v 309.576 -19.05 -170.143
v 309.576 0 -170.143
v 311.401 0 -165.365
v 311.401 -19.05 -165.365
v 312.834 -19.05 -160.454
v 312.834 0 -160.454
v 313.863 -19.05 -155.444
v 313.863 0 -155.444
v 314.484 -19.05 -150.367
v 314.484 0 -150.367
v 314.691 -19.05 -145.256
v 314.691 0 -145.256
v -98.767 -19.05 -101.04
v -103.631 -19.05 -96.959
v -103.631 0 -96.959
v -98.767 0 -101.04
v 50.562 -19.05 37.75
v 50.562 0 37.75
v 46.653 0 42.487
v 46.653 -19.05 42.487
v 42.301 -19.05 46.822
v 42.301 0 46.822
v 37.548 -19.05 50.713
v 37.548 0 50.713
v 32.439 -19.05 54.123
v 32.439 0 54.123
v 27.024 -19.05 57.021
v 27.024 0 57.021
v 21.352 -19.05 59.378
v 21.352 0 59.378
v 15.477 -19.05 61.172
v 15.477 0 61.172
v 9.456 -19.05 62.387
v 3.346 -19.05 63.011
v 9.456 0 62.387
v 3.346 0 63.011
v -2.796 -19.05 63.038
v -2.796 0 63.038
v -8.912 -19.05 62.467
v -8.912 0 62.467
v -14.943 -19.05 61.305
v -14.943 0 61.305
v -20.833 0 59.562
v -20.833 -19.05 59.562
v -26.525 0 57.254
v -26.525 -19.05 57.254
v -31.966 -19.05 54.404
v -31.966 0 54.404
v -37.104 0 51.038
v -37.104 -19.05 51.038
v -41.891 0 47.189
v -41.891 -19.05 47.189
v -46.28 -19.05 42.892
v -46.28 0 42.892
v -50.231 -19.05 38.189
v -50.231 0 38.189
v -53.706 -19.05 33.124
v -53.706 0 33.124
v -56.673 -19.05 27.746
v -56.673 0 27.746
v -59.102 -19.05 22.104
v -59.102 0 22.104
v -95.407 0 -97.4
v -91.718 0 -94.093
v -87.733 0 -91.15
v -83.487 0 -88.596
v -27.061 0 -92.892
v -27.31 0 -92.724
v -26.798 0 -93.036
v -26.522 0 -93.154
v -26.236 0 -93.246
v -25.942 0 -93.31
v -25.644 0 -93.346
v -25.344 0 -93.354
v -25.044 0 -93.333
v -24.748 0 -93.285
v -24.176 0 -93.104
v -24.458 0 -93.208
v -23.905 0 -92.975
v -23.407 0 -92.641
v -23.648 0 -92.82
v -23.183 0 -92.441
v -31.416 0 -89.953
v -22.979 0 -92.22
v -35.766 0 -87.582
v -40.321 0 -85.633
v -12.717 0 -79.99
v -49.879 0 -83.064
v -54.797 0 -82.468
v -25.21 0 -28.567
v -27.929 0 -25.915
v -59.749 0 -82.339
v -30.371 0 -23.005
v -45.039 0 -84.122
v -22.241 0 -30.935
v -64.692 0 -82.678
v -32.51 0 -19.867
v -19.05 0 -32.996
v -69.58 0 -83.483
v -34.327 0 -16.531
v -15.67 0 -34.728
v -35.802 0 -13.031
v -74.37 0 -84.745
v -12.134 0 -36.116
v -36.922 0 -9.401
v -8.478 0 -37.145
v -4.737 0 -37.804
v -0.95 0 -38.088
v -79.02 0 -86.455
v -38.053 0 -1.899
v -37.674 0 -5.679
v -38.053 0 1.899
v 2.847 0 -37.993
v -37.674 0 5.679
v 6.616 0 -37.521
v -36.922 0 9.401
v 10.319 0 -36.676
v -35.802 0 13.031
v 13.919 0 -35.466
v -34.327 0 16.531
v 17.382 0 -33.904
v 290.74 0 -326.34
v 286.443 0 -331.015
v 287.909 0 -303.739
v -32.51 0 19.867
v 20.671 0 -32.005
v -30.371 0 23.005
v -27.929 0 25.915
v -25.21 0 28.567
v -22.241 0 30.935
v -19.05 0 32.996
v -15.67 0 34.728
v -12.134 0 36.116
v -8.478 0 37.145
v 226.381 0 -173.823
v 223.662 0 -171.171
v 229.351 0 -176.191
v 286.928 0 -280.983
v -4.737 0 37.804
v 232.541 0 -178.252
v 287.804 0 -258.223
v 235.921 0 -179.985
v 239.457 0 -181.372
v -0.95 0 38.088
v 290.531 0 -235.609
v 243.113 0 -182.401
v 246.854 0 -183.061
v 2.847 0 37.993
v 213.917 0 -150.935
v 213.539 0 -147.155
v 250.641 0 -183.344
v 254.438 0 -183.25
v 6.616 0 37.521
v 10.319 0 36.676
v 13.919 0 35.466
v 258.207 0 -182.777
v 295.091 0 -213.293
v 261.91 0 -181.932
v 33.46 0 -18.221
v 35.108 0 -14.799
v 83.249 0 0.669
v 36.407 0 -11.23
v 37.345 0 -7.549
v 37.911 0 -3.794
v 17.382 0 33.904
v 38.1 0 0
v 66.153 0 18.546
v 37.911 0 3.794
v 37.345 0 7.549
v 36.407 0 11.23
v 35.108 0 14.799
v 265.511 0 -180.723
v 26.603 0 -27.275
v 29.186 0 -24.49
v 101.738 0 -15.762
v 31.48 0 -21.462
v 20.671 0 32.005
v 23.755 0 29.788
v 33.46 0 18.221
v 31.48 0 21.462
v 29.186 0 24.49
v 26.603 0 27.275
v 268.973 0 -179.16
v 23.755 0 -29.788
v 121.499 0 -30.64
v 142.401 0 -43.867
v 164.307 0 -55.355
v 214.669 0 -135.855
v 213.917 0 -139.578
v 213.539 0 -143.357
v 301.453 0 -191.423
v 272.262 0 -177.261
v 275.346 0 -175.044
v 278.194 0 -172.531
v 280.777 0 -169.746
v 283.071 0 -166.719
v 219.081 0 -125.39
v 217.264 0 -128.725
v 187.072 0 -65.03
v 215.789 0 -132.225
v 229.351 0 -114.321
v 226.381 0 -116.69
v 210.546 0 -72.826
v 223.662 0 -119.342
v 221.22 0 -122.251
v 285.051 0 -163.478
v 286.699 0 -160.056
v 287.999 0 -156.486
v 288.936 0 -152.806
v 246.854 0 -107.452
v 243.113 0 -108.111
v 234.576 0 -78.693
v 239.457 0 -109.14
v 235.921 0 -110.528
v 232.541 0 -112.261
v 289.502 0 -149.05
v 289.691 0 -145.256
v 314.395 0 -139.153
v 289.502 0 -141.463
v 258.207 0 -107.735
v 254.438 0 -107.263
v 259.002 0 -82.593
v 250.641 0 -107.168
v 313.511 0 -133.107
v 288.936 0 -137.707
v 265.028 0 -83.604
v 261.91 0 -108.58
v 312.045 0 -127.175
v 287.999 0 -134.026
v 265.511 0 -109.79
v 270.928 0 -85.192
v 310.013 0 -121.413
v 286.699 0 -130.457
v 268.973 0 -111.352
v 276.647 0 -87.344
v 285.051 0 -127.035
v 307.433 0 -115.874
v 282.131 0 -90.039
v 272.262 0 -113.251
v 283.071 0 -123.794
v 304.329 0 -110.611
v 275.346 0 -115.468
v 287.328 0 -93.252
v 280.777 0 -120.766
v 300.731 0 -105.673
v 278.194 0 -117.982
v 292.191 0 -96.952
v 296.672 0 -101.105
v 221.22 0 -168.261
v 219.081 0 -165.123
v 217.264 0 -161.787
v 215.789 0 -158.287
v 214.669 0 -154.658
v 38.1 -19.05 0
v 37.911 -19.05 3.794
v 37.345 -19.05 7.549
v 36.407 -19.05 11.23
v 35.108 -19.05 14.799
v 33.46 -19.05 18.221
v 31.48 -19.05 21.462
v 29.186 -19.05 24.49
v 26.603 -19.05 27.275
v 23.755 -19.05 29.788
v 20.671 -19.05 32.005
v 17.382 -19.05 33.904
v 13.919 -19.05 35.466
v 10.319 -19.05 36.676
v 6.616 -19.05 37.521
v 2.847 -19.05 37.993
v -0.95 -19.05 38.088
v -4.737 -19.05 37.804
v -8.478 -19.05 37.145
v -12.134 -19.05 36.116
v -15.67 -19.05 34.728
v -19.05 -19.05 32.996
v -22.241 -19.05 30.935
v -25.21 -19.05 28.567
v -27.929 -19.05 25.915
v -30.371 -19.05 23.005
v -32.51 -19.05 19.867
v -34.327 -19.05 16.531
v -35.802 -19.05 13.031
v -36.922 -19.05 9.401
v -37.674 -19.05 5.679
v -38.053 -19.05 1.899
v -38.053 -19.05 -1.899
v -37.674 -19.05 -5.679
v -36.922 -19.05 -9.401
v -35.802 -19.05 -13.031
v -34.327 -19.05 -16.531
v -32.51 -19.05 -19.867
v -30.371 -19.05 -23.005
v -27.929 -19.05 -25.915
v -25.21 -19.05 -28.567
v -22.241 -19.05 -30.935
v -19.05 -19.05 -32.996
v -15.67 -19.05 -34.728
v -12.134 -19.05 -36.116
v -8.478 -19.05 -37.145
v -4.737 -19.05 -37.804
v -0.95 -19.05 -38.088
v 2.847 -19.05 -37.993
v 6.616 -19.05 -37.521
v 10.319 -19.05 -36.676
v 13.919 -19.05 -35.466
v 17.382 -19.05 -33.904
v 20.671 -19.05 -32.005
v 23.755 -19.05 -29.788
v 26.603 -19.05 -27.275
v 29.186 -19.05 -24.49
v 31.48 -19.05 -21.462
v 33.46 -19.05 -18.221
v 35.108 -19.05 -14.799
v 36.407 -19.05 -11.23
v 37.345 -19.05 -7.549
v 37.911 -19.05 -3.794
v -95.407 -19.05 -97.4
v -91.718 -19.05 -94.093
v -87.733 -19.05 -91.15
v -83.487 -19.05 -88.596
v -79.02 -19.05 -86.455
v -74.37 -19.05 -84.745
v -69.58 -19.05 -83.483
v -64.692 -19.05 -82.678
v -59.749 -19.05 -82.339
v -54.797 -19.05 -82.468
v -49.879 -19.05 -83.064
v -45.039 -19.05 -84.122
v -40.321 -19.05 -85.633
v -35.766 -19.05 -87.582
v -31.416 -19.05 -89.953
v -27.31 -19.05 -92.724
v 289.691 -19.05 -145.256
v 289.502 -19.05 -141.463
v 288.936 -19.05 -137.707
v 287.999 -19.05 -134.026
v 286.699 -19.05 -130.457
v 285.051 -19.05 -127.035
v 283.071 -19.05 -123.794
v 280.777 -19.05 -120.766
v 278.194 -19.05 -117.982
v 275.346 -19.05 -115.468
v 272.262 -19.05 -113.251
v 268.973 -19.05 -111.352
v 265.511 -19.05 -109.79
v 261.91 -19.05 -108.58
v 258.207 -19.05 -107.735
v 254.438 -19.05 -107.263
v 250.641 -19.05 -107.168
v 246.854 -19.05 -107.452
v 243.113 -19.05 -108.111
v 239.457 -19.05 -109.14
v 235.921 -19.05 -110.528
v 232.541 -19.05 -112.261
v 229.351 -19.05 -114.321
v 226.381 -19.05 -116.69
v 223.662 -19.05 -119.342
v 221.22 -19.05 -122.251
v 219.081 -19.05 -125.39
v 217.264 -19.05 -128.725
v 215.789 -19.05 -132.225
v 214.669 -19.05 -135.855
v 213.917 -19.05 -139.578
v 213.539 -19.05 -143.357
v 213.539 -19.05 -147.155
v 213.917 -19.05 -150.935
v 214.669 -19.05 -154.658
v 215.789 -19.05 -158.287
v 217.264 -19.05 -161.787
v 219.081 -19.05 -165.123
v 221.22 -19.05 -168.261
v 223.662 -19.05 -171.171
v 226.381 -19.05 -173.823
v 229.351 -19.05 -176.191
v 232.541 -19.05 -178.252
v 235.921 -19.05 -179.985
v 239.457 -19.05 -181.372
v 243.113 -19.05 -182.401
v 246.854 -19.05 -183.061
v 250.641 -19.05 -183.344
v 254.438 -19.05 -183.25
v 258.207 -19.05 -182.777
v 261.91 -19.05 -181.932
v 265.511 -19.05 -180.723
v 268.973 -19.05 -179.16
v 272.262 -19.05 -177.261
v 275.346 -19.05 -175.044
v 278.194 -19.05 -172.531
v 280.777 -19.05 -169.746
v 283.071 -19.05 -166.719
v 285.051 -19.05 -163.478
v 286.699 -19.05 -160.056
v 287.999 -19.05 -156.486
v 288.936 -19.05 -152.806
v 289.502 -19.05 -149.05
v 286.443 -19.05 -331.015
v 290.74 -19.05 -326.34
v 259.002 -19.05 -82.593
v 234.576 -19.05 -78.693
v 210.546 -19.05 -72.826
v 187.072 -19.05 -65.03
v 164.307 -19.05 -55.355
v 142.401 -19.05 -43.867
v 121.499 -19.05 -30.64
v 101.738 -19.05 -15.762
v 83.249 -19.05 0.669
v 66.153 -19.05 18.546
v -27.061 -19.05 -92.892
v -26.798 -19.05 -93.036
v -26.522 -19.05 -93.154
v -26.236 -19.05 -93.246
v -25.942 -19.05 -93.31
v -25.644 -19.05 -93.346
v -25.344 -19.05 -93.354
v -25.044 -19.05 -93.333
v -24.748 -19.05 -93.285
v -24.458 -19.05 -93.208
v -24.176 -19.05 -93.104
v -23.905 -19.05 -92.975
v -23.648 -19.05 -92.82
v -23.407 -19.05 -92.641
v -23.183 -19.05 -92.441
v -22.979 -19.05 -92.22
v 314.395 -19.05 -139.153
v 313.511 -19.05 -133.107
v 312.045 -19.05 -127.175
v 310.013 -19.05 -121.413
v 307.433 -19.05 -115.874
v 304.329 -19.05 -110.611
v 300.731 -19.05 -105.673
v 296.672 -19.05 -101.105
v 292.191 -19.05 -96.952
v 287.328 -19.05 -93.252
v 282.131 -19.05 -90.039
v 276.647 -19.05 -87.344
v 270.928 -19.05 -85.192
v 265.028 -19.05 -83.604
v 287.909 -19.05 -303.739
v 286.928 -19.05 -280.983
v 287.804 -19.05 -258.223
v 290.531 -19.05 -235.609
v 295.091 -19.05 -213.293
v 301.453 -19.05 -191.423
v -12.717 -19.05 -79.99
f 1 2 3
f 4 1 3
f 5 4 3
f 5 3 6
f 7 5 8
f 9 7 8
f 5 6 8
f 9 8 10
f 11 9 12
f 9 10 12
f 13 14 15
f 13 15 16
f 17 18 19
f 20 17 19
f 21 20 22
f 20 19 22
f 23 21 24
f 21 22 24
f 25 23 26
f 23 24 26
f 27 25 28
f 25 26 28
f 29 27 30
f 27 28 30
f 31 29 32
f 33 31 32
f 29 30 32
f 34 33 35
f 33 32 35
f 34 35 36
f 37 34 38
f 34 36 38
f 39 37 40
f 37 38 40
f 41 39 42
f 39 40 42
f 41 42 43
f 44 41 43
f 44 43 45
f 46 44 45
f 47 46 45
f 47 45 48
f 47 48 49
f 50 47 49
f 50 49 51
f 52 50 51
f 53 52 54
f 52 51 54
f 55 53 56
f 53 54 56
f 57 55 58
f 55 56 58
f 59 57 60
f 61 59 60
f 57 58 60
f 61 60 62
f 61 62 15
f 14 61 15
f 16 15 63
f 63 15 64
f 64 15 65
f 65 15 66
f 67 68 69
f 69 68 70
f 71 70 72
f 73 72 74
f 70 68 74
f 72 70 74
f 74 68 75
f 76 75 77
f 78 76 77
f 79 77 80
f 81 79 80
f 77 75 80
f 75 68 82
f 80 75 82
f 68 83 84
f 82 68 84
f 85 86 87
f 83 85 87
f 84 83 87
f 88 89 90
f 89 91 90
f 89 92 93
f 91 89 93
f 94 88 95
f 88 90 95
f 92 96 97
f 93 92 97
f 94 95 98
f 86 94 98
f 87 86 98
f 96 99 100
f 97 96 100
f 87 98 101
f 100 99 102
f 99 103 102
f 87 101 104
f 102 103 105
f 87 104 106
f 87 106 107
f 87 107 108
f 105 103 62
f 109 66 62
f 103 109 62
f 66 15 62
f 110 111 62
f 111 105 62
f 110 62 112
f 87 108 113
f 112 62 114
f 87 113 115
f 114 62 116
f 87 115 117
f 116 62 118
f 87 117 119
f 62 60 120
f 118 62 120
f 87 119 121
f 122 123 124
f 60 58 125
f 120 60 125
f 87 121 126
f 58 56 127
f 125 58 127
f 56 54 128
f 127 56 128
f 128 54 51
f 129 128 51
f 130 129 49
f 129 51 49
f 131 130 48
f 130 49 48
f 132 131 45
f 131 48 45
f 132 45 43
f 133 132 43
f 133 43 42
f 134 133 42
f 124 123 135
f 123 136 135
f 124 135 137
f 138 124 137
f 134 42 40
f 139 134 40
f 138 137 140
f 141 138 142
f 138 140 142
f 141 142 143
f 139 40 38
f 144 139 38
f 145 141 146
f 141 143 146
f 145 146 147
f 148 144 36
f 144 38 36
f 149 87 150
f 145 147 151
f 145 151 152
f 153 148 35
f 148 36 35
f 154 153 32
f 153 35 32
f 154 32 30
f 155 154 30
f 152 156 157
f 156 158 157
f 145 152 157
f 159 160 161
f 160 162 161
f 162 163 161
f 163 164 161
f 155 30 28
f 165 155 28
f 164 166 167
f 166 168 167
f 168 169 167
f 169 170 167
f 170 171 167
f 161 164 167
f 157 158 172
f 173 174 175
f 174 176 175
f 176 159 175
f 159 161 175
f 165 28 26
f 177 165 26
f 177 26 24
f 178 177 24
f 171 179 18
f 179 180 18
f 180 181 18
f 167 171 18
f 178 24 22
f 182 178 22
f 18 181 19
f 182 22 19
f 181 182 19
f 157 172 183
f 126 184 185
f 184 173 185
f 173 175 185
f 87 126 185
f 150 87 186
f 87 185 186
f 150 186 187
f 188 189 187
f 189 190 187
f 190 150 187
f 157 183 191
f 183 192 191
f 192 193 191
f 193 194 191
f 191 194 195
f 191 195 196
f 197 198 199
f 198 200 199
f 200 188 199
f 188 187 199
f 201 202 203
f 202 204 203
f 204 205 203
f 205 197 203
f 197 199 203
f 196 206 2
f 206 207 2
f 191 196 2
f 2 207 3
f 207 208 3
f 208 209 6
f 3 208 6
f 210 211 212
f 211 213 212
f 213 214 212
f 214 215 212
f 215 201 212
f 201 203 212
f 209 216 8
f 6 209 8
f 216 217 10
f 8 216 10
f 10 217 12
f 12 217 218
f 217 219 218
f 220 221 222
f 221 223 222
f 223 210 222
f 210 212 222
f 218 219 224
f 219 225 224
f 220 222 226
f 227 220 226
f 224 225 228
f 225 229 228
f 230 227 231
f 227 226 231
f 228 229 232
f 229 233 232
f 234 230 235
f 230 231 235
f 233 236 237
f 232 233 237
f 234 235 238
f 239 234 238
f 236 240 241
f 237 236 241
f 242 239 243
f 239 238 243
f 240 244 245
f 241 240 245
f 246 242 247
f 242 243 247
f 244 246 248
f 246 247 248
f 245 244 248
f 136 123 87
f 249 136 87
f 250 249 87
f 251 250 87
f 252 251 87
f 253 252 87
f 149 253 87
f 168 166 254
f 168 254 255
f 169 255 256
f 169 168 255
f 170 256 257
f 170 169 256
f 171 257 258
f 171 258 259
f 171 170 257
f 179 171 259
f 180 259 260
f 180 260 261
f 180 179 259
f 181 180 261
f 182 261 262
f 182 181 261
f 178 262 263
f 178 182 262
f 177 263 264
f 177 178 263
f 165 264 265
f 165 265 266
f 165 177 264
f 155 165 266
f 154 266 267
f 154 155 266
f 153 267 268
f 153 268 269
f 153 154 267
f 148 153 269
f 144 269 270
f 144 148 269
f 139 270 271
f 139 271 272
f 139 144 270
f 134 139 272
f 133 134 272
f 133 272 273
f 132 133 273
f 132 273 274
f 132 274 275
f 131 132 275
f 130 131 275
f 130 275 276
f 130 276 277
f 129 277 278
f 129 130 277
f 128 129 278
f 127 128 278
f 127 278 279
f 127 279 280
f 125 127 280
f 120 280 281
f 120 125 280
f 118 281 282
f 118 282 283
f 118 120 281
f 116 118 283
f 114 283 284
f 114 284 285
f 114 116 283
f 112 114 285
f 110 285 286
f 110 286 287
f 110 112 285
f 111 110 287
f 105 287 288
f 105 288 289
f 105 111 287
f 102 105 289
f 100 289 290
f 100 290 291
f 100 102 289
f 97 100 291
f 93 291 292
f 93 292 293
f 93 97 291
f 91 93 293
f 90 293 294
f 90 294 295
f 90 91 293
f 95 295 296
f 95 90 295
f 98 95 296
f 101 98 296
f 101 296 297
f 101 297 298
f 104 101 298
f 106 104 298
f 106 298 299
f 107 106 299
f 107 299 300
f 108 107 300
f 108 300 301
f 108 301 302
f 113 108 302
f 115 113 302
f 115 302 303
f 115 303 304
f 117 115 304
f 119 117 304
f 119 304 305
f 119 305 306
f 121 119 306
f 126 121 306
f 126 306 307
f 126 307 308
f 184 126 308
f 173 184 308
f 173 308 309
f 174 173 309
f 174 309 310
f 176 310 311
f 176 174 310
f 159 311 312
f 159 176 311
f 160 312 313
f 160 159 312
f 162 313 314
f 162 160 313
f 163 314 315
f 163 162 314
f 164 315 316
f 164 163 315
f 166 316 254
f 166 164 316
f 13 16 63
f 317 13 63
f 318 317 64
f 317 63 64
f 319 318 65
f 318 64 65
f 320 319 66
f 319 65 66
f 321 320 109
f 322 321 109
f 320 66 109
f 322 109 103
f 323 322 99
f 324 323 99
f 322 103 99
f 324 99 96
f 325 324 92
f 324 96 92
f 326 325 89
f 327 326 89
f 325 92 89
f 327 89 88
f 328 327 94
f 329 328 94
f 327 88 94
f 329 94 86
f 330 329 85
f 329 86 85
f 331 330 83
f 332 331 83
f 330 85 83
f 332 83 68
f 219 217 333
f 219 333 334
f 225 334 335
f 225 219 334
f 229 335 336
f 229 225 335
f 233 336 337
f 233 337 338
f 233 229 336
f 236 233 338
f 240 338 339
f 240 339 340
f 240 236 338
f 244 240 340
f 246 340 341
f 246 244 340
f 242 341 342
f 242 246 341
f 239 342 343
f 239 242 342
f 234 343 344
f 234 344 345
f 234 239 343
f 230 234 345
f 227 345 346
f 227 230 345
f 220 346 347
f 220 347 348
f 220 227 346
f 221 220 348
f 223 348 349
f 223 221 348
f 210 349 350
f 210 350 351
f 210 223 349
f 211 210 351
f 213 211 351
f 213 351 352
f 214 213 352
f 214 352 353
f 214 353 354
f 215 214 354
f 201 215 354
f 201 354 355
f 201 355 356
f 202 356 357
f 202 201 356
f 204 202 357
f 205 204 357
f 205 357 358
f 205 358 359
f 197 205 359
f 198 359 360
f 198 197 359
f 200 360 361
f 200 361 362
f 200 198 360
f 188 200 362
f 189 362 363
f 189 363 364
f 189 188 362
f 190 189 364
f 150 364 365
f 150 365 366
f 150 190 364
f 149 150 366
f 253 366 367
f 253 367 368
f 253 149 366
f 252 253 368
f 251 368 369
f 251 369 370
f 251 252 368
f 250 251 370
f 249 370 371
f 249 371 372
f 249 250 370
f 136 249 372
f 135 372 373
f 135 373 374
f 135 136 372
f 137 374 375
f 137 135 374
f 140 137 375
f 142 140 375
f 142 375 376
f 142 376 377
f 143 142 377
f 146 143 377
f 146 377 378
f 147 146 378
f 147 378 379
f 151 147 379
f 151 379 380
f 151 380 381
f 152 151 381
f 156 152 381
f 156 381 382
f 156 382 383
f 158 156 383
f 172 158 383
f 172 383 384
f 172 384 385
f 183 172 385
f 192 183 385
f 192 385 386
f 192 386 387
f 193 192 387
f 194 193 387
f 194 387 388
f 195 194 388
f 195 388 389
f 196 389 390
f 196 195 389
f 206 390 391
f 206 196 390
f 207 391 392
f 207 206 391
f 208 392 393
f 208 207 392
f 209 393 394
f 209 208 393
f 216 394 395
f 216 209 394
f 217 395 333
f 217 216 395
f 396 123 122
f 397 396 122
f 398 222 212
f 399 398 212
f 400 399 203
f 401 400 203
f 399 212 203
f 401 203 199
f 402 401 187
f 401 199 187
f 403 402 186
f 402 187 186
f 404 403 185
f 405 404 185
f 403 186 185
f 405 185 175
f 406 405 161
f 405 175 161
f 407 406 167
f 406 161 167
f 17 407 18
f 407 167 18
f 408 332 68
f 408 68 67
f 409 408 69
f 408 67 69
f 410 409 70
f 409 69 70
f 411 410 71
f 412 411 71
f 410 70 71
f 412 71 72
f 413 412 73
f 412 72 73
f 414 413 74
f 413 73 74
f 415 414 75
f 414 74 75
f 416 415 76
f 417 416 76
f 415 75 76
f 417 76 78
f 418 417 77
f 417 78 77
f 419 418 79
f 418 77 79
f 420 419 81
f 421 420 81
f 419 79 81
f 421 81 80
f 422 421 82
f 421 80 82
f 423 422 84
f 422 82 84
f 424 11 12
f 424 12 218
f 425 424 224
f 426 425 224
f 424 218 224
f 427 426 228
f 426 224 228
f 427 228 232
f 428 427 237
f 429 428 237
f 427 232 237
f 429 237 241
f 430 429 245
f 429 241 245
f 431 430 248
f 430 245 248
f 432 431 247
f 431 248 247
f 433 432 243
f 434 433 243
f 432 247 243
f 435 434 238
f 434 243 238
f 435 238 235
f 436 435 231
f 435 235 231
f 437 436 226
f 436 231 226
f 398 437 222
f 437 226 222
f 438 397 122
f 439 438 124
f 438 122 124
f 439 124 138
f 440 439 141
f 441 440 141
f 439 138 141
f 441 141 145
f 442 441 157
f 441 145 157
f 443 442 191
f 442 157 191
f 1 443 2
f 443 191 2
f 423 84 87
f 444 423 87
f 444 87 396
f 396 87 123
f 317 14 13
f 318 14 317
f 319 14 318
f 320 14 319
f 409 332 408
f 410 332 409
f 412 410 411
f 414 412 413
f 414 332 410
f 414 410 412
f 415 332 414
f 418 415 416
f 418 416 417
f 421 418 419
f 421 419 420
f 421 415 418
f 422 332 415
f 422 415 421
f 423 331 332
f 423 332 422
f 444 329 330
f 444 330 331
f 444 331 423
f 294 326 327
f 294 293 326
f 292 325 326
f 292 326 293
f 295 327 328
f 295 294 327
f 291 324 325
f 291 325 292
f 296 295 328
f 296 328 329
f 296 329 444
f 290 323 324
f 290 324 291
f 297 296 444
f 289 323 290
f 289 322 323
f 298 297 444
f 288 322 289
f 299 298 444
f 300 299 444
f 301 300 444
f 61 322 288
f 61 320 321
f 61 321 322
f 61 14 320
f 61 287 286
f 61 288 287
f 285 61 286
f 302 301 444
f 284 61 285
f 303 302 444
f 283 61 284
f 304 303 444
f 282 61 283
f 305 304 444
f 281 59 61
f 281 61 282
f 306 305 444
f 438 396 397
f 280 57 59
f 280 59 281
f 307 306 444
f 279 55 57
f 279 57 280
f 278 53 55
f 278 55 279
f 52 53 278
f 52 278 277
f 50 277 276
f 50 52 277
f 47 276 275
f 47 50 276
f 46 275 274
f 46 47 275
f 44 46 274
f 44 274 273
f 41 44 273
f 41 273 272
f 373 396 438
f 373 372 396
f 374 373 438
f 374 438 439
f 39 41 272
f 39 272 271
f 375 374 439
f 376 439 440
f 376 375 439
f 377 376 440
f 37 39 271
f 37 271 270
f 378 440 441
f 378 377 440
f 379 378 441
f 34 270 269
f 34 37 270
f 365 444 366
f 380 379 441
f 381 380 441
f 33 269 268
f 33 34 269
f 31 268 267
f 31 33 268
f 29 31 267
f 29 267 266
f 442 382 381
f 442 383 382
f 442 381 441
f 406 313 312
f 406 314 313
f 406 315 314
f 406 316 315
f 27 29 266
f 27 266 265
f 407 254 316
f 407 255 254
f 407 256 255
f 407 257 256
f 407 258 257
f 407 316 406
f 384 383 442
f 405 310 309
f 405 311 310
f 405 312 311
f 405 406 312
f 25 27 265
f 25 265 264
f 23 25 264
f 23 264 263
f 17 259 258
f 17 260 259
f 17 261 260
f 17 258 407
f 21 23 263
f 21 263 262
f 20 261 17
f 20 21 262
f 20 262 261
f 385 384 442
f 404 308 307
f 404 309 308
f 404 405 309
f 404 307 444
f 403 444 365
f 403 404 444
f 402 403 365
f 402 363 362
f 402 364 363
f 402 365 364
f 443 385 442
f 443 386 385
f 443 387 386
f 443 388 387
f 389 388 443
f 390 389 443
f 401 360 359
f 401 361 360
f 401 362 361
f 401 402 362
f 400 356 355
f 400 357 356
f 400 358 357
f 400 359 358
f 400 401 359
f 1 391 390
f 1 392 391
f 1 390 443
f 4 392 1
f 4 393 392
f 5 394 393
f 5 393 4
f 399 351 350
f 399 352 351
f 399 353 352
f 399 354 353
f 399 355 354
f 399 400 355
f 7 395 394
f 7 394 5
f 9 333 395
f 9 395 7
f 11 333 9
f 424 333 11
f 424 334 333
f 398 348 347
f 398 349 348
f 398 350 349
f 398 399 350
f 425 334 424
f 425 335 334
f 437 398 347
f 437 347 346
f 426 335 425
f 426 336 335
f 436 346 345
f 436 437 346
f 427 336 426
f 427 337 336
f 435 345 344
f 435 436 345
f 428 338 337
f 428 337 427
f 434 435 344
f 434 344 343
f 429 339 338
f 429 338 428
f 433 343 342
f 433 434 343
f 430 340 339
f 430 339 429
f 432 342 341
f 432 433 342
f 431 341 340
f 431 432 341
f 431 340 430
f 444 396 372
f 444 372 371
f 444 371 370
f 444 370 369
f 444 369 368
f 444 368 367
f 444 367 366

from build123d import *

# Parameters (mm, degrees)
F1_R     = 38.1
F2_DEPTH = 19.05


with BuildPart() as f2:
    # F1 (on Front) → F2 (new body)
    with BuildSketch(Plane.XZ):
        with BuildLine():
            ThreePointArc((-59.101749, 22.104146), (-11.231421, -62.092392), (63.1, 0))
            ThreePointArc((63.1, 0), (59.883643, 19.888671), (50.562465, 37.749797))
            ThreePointArc((50.562465, 37.749797), (-8.912151, 62.46746), (-59.101749, 22.104146))
        make_face()
        Circle(F1_R, mode=Mode.SUBTRACT)
        with BuildLine():
            ThreePointArc((50.562465, 37.749797), (59.883643, 19.888671), (63.1, 0))
            ThreePointArc((63.1, 0), (-11.231421, -62.092392), (-59.101749, 22.104146))
            Line((-59.101749, 22.104146), (-103.631373, -96.958523))
            Line((-103.631373, -96.958523), (-98.76699, -101.040224))
            ThreePointArc((-98.76699, -101.040224), (-64.691543, -82.67794), (-27.310033, -92.72445))
            ThreePointArc((-27.310033, -92.72445), (-25.044487, -93.333329), (-22.979308, -92.220464))
            Line((-22.979308, -92.220464), (-12.716697, -79.98996))
            Line((-12.716697, -79.98996), (286.442809, -331.014591))
            Line((286.442809, -331.014591), (290.740471, -326.339915))
            ThreePointArc((290.740471, -326.339915), (288.937178, -246.888288), (309.576211, -170.142975))
            ThreePointArc((309.576211, -170.142975), (196.952283, -176.818858), (259.002256, -82.592973))
            ThreePointArc((259.002256, -82.592973), (142.400804, -43.867073), (50.562465, 37.749797))
        make_face()
        with BuildLine():
            ThreePointArc((314.691205, -145.25625), (298.757121, -103.339829), (259.002256, -82.592973))
            ThreePointArc((259.002256, -82.592973), (196.952283, -176.818858), (309.576211, -170.142975))
            ThreePointArc((309.576211, -170.142975), (313.39923, -157.959716), (314.691205, -145.25625))
        make_face()
        with Locations((251.591205, -145.25625)):
            Circle(F1_R, mode=Mode.SUBTRACT)
    extrude(amount=F2_DEPTH)


solid = f2.part
